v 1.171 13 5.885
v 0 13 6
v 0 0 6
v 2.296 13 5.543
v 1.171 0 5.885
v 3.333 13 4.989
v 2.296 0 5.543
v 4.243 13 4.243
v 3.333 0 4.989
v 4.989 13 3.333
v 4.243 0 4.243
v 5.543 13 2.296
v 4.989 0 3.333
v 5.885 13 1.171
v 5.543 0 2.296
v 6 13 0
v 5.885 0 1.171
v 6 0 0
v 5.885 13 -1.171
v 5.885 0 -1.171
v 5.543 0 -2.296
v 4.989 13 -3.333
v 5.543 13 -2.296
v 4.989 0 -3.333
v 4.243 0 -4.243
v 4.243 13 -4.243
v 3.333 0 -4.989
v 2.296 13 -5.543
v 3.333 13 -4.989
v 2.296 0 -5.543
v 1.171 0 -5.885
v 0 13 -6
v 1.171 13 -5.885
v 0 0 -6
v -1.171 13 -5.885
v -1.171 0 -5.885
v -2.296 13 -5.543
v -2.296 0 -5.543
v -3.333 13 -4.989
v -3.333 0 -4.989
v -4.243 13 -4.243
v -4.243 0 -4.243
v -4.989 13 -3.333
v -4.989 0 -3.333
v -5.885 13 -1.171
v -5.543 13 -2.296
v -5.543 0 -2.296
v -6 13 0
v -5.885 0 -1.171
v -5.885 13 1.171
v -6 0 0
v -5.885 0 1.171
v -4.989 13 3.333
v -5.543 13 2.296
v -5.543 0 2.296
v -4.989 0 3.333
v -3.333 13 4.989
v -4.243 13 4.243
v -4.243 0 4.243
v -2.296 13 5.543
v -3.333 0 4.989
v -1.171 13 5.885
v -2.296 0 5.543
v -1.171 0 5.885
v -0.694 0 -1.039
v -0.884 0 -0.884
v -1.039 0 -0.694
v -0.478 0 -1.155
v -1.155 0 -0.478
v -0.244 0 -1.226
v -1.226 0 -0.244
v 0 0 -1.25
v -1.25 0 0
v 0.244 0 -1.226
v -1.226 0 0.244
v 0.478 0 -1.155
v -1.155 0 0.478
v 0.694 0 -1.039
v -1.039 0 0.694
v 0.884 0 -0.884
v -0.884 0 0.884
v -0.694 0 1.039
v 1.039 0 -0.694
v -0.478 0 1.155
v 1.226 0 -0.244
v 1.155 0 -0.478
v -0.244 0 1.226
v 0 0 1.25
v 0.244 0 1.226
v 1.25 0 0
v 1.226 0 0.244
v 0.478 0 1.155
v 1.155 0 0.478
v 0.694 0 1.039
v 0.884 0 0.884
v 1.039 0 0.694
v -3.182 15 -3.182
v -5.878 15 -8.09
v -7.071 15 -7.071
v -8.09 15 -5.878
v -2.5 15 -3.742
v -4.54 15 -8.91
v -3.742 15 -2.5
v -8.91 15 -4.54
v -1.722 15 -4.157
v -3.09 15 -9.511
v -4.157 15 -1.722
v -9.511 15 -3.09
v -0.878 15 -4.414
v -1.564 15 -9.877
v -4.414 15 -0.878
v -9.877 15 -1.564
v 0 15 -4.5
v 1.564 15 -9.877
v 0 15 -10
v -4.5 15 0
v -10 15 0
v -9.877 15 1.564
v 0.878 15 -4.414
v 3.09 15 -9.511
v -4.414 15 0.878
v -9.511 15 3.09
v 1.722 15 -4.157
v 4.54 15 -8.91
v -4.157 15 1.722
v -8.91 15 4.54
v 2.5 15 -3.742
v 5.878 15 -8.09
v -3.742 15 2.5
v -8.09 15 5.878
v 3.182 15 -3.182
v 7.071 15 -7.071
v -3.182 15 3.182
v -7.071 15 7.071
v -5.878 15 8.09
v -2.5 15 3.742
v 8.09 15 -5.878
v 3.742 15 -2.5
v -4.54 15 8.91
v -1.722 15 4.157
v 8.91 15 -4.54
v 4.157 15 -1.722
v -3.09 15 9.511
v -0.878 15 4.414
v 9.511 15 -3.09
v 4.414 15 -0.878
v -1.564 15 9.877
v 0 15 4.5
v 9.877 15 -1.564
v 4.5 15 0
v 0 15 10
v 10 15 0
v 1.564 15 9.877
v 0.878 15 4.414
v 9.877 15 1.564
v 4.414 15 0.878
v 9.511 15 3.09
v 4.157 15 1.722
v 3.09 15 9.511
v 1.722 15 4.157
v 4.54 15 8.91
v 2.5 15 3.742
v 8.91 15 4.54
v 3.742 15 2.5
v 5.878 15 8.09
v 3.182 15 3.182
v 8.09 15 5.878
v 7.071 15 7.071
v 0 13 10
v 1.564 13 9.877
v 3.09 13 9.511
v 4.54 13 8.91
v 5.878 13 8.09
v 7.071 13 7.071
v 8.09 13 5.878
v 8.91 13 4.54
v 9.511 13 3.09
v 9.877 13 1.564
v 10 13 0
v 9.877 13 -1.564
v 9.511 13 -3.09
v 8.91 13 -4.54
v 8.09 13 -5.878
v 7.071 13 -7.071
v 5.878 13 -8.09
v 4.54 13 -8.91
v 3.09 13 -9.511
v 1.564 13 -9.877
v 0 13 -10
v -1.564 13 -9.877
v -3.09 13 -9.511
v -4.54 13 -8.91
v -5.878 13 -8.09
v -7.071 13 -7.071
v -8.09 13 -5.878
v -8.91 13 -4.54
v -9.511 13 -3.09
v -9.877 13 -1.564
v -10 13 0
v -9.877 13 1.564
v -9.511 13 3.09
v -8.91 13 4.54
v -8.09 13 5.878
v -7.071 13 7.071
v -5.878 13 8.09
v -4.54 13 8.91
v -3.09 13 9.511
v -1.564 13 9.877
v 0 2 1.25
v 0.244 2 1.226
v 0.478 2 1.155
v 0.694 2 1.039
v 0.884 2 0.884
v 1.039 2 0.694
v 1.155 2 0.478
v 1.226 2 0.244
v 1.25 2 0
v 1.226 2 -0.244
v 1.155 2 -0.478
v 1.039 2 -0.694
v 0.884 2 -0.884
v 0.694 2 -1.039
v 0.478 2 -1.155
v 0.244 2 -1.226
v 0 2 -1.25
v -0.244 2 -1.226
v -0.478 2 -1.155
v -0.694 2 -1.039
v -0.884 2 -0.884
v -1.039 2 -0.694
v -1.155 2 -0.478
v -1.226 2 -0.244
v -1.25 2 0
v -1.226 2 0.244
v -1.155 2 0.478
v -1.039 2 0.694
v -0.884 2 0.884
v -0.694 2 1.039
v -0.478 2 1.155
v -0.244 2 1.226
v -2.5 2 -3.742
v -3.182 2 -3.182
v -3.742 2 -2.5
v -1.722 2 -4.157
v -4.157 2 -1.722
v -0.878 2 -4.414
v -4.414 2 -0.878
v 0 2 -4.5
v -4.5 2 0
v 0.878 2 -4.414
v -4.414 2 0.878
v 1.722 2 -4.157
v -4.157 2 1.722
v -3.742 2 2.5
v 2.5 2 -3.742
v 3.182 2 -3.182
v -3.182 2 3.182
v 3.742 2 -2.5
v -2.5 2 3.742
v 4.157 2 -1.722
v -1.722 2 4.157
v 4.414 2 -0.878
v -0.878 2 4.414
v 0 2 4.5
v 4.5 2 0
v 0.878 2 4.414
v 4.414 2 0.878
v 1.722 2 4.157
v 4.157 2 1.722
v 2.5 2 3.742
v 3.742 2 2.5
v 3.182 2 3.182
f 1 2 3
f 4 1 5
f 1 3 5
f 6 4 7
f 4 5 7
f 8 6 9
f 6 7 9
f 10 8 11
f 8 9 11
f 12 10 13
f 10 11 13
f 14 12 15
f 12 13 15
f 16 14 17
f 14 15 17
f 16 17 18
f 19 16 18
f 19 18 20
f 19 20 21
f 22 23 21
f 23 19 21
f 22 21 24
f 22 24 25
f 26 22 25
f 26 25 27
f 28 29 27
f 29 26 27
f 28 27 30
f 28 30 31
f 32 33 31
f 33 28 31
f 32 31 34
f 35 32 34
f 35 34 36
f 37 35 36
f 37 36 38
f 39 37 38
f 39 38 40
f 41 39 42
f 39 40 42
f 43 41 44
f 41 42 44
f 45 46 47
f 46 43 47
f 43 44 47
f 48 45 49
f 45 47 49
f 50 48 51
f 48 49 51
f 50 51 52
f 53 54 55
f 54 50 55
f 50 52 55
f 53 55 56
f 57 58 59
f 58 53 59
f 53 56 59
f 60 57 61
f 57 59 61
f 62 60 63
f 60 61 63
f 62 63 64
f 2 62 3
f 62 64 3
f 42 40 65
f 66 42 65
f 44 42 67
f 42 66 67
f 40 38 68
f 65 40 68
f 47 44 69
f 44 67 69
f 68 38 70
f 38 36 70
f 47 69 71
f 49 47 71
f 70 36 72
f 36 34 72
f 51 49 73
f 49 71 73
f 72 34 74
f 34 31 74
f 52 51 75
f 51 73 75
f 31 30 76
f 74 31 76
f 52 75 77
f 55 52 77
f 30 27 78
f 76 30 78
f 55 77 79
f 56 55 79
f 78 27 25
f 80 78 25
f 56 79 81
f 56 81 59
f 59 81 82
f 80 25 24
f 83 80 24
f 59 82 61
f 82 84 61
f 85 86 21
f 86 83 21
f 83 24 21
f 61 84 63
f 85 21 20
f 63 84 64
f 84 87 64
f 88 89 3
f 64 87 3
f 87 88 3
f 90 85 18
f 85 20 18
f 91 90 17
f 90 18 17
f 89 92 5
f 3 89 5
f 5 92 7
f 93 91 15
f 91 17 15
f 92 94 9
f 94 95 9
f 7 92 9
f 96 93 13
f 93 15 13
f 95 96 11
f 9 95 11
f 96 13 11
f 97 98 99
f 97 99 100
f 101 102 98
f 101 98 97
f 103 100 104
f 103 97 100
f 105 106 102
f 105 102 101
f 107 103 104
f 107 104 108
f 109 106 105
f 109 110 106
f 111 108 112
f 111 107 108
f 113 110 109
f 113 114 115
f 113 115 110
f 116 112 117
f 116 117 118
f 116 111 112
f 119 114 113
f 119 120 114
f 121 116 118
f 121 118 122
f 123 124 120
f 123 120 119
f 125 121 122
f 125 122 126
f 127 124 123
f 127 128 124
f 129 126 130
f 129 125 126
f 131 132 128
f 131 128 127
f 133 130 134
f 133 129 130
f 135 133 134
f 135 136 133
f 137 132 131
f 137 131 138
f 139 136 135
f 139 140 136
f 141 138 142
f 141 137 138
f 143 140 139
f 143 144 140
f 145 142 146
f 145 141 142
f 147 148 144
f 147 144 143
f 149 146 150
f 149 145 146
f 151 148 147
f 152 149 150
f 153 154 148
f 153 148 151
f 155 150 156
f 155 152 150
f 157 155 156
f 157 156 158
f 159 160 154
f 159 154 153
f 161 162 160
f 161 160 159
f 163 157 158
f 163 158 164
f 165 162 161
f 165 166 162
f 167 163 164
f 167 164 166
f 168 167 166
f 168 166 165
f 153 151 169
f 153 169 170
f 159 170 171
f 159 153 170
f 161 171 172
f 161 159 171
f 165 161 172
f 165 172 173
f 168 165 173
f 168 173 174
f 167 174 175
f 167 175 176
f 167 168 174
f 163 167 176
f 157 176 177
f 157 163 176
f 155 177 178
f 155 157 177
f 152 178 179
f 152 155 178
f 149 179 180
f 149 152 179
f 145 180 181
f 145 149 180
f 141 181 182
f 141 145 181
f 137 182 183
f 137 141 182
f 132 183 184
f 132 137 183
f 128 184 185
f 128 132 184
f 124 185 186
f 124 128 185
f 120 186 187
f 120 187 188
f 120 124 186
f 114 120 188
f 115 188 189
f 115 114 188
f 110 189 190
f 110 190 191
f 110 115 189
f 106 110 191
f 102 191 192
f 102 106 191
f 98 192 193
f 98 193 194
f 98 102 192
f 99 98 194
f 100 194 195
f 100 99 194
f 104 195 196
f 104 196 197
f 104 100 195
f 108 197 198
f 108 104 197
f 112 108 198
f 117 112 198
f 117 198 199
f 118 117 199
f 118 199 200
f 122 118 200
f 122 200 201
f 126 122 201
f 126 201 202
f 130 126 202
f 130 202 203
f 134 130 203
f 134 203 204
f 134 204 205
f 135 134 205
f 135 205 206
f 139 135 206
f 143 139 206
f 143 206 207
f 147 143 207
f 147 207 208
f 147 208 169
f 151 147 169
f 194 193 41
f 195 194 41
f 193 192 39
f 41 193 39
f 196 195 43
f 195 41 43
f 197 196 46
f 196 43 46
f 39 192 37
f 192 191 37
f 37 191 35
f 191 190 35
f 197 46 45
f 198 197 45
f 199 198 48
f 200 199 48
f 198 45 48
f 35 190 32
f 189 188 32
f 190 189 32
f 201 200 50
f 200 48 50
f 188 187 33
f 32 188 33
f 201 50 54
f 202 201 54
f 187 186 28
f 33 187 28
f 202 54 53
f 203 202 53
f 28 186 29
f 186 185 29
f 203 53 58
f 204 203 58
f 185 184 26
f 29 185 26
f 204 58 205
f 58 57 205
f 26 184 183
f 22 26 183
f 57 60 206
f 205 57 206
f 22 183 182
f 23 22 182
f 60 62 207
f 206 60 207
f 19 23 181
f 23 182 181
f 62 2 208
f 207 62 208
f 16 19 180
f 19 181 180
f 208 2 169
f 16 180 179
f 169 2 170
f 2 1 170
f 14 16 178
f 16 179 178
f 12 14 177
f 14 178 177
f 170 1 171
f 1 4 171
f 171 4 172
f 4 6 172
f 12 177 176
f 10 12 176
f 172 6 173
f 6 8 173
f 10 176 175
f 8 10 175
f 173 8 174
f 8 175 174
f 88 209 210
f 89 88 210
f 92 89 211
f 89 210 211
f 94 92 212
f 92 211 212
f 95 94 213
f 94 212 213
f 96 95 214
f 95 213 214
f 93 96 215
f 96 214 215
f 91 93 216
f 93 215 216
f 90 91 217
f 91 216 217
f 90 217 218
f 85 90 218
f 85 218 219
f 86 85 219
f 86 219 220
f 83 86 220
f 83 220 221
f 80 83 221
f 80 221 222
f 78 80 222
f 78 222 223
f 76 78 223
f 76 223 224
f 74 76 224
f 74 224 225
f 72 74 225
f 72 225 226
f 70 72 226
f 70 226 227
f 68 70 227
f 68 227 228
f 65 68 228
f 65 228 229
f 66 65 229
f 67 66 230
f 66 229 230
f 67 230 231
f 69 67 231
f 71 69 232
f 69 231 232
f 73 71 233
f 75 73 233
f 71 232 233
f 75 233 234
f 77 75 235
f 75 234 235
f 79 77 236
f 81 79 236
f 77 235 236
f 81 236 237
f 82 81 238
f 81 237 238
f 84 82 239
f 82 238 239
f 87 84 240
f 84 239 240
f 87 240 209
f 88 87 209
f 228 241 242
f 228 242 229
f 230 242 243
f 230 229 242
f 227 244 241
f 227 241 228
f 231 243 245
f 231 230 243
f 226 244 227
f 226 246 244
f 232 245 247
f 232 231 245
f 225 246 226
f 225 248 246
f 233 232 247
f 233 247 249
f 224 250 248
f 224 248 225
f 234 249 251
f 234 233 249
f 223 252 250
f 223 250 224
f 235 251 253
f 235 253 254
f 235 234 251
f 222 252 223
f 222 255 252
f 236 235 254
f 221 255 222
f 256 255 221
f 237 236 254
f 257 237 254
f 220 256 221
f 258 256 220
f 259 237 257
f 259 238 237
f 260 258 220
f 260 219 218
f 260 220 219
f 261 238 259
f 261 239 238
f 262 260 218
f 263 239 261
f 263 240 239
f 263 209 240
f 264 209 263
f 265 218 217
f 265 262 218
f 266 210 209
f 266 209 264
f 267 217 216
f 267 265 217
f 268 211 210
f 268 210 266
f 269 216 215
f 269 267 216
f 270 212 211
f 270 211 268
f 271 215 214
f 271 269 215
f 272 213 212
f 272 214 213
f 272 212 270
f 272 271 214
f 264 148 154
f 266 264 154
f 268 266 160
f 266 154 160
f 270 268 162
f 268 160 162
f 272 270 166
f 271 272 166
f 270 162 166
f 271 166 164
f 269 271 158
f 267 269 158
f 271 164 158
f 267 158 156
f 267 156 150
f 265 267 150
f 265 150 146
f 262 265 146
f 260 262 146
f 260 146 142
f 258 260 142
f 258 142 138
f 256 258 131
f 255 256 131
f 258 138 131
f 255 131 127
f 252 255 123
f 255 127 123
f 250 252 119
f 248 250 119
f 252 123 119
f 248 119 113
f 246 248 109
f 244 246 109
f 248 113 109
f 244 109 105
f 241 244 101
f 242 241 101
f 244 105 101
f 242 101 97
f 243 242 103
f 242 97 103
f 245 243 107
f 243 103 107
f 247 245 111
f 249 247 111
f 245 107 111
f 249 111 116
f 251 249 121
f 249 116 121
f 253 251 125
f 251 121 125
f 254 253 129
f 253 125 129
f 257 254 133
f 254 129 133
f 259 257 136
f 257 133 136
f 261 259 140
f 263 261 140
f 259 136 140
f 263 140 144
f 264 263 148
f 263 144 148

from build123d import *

# Parameters (mm, degrees)
ESQUISSE1_R             = 6
BOSS_EXTRU_1_DEPTH      = 15
ESQUISSE3_R             = 10
BOSS_EXTRU_2_DEPTH      = 2
ESQUISSE2_R             = 4.5
ENL_V_MAT_EXTRU_2_DEPTH = 13
ESQUISSE4_R             = 1.25
ENL_V_MAT_EXTRU_3_DEPTH = 20.209372712


with BuildPart() as part:
    # Esquisse1 → Boss.-Extru.1 (new body)
    with BuildSketch(Plane(origin=(0, 0, 0), x_dir=(1, 0, 0), z_dir=(0, 1, 0))):
        with Locations(Location((0, 0, 0), (0, 0, 270))):
            Circle(ESQUISSE1_R)
    extrude(amount=BOSS_EXTRU_1_DEPTH)

    # Esquisse3 → Boss.-Extru.2 (add)
    with BuildSketch(Plane(origin=(0, 15, 0), x_dir=(1, 0, 0), z_dir=(0, 1, 0))):
        with Locations(Location((0, 0, 0), (0, 0, 270))):
            Circle(ESQUISSE3_R)
    extrude(amount=-BOSS_EXTRU_2_DEPTH)

    # Esquisse2 → Enlèv. mat.-Extru.2 (cut)
    with BuildSketch(Plane(origin=(0, 15, 0), x_dir=(1, 0, 0), z_dir=(0, 1, 0))):
        with Locations(Location((0, 0, 0), (0, 0, 270))):
            Circle(ESQUISSE2_R)
    extrude(amount=-ENL_V_MAT_EXTRU_2_DEPTH, mode=Mode.SUBTRACT)

    # Esquisse4 → Enlèv. mat.-Extru.3 (cut, through all)
    with BuildSketch(Plane(origin=(0, 2, 0), x_dir=(1, 0, 0), z_dir=(0, 1, 0))):
        with Locations(Location((0, 0, 0), (0, 0, 270))):
            Circle(ESQUISSE4_R)
    extrude(amount=-ENL_V_MAT_EXTRU_3_DEPTH, mode=Mode.SUBTRACT)


solid = part.part
